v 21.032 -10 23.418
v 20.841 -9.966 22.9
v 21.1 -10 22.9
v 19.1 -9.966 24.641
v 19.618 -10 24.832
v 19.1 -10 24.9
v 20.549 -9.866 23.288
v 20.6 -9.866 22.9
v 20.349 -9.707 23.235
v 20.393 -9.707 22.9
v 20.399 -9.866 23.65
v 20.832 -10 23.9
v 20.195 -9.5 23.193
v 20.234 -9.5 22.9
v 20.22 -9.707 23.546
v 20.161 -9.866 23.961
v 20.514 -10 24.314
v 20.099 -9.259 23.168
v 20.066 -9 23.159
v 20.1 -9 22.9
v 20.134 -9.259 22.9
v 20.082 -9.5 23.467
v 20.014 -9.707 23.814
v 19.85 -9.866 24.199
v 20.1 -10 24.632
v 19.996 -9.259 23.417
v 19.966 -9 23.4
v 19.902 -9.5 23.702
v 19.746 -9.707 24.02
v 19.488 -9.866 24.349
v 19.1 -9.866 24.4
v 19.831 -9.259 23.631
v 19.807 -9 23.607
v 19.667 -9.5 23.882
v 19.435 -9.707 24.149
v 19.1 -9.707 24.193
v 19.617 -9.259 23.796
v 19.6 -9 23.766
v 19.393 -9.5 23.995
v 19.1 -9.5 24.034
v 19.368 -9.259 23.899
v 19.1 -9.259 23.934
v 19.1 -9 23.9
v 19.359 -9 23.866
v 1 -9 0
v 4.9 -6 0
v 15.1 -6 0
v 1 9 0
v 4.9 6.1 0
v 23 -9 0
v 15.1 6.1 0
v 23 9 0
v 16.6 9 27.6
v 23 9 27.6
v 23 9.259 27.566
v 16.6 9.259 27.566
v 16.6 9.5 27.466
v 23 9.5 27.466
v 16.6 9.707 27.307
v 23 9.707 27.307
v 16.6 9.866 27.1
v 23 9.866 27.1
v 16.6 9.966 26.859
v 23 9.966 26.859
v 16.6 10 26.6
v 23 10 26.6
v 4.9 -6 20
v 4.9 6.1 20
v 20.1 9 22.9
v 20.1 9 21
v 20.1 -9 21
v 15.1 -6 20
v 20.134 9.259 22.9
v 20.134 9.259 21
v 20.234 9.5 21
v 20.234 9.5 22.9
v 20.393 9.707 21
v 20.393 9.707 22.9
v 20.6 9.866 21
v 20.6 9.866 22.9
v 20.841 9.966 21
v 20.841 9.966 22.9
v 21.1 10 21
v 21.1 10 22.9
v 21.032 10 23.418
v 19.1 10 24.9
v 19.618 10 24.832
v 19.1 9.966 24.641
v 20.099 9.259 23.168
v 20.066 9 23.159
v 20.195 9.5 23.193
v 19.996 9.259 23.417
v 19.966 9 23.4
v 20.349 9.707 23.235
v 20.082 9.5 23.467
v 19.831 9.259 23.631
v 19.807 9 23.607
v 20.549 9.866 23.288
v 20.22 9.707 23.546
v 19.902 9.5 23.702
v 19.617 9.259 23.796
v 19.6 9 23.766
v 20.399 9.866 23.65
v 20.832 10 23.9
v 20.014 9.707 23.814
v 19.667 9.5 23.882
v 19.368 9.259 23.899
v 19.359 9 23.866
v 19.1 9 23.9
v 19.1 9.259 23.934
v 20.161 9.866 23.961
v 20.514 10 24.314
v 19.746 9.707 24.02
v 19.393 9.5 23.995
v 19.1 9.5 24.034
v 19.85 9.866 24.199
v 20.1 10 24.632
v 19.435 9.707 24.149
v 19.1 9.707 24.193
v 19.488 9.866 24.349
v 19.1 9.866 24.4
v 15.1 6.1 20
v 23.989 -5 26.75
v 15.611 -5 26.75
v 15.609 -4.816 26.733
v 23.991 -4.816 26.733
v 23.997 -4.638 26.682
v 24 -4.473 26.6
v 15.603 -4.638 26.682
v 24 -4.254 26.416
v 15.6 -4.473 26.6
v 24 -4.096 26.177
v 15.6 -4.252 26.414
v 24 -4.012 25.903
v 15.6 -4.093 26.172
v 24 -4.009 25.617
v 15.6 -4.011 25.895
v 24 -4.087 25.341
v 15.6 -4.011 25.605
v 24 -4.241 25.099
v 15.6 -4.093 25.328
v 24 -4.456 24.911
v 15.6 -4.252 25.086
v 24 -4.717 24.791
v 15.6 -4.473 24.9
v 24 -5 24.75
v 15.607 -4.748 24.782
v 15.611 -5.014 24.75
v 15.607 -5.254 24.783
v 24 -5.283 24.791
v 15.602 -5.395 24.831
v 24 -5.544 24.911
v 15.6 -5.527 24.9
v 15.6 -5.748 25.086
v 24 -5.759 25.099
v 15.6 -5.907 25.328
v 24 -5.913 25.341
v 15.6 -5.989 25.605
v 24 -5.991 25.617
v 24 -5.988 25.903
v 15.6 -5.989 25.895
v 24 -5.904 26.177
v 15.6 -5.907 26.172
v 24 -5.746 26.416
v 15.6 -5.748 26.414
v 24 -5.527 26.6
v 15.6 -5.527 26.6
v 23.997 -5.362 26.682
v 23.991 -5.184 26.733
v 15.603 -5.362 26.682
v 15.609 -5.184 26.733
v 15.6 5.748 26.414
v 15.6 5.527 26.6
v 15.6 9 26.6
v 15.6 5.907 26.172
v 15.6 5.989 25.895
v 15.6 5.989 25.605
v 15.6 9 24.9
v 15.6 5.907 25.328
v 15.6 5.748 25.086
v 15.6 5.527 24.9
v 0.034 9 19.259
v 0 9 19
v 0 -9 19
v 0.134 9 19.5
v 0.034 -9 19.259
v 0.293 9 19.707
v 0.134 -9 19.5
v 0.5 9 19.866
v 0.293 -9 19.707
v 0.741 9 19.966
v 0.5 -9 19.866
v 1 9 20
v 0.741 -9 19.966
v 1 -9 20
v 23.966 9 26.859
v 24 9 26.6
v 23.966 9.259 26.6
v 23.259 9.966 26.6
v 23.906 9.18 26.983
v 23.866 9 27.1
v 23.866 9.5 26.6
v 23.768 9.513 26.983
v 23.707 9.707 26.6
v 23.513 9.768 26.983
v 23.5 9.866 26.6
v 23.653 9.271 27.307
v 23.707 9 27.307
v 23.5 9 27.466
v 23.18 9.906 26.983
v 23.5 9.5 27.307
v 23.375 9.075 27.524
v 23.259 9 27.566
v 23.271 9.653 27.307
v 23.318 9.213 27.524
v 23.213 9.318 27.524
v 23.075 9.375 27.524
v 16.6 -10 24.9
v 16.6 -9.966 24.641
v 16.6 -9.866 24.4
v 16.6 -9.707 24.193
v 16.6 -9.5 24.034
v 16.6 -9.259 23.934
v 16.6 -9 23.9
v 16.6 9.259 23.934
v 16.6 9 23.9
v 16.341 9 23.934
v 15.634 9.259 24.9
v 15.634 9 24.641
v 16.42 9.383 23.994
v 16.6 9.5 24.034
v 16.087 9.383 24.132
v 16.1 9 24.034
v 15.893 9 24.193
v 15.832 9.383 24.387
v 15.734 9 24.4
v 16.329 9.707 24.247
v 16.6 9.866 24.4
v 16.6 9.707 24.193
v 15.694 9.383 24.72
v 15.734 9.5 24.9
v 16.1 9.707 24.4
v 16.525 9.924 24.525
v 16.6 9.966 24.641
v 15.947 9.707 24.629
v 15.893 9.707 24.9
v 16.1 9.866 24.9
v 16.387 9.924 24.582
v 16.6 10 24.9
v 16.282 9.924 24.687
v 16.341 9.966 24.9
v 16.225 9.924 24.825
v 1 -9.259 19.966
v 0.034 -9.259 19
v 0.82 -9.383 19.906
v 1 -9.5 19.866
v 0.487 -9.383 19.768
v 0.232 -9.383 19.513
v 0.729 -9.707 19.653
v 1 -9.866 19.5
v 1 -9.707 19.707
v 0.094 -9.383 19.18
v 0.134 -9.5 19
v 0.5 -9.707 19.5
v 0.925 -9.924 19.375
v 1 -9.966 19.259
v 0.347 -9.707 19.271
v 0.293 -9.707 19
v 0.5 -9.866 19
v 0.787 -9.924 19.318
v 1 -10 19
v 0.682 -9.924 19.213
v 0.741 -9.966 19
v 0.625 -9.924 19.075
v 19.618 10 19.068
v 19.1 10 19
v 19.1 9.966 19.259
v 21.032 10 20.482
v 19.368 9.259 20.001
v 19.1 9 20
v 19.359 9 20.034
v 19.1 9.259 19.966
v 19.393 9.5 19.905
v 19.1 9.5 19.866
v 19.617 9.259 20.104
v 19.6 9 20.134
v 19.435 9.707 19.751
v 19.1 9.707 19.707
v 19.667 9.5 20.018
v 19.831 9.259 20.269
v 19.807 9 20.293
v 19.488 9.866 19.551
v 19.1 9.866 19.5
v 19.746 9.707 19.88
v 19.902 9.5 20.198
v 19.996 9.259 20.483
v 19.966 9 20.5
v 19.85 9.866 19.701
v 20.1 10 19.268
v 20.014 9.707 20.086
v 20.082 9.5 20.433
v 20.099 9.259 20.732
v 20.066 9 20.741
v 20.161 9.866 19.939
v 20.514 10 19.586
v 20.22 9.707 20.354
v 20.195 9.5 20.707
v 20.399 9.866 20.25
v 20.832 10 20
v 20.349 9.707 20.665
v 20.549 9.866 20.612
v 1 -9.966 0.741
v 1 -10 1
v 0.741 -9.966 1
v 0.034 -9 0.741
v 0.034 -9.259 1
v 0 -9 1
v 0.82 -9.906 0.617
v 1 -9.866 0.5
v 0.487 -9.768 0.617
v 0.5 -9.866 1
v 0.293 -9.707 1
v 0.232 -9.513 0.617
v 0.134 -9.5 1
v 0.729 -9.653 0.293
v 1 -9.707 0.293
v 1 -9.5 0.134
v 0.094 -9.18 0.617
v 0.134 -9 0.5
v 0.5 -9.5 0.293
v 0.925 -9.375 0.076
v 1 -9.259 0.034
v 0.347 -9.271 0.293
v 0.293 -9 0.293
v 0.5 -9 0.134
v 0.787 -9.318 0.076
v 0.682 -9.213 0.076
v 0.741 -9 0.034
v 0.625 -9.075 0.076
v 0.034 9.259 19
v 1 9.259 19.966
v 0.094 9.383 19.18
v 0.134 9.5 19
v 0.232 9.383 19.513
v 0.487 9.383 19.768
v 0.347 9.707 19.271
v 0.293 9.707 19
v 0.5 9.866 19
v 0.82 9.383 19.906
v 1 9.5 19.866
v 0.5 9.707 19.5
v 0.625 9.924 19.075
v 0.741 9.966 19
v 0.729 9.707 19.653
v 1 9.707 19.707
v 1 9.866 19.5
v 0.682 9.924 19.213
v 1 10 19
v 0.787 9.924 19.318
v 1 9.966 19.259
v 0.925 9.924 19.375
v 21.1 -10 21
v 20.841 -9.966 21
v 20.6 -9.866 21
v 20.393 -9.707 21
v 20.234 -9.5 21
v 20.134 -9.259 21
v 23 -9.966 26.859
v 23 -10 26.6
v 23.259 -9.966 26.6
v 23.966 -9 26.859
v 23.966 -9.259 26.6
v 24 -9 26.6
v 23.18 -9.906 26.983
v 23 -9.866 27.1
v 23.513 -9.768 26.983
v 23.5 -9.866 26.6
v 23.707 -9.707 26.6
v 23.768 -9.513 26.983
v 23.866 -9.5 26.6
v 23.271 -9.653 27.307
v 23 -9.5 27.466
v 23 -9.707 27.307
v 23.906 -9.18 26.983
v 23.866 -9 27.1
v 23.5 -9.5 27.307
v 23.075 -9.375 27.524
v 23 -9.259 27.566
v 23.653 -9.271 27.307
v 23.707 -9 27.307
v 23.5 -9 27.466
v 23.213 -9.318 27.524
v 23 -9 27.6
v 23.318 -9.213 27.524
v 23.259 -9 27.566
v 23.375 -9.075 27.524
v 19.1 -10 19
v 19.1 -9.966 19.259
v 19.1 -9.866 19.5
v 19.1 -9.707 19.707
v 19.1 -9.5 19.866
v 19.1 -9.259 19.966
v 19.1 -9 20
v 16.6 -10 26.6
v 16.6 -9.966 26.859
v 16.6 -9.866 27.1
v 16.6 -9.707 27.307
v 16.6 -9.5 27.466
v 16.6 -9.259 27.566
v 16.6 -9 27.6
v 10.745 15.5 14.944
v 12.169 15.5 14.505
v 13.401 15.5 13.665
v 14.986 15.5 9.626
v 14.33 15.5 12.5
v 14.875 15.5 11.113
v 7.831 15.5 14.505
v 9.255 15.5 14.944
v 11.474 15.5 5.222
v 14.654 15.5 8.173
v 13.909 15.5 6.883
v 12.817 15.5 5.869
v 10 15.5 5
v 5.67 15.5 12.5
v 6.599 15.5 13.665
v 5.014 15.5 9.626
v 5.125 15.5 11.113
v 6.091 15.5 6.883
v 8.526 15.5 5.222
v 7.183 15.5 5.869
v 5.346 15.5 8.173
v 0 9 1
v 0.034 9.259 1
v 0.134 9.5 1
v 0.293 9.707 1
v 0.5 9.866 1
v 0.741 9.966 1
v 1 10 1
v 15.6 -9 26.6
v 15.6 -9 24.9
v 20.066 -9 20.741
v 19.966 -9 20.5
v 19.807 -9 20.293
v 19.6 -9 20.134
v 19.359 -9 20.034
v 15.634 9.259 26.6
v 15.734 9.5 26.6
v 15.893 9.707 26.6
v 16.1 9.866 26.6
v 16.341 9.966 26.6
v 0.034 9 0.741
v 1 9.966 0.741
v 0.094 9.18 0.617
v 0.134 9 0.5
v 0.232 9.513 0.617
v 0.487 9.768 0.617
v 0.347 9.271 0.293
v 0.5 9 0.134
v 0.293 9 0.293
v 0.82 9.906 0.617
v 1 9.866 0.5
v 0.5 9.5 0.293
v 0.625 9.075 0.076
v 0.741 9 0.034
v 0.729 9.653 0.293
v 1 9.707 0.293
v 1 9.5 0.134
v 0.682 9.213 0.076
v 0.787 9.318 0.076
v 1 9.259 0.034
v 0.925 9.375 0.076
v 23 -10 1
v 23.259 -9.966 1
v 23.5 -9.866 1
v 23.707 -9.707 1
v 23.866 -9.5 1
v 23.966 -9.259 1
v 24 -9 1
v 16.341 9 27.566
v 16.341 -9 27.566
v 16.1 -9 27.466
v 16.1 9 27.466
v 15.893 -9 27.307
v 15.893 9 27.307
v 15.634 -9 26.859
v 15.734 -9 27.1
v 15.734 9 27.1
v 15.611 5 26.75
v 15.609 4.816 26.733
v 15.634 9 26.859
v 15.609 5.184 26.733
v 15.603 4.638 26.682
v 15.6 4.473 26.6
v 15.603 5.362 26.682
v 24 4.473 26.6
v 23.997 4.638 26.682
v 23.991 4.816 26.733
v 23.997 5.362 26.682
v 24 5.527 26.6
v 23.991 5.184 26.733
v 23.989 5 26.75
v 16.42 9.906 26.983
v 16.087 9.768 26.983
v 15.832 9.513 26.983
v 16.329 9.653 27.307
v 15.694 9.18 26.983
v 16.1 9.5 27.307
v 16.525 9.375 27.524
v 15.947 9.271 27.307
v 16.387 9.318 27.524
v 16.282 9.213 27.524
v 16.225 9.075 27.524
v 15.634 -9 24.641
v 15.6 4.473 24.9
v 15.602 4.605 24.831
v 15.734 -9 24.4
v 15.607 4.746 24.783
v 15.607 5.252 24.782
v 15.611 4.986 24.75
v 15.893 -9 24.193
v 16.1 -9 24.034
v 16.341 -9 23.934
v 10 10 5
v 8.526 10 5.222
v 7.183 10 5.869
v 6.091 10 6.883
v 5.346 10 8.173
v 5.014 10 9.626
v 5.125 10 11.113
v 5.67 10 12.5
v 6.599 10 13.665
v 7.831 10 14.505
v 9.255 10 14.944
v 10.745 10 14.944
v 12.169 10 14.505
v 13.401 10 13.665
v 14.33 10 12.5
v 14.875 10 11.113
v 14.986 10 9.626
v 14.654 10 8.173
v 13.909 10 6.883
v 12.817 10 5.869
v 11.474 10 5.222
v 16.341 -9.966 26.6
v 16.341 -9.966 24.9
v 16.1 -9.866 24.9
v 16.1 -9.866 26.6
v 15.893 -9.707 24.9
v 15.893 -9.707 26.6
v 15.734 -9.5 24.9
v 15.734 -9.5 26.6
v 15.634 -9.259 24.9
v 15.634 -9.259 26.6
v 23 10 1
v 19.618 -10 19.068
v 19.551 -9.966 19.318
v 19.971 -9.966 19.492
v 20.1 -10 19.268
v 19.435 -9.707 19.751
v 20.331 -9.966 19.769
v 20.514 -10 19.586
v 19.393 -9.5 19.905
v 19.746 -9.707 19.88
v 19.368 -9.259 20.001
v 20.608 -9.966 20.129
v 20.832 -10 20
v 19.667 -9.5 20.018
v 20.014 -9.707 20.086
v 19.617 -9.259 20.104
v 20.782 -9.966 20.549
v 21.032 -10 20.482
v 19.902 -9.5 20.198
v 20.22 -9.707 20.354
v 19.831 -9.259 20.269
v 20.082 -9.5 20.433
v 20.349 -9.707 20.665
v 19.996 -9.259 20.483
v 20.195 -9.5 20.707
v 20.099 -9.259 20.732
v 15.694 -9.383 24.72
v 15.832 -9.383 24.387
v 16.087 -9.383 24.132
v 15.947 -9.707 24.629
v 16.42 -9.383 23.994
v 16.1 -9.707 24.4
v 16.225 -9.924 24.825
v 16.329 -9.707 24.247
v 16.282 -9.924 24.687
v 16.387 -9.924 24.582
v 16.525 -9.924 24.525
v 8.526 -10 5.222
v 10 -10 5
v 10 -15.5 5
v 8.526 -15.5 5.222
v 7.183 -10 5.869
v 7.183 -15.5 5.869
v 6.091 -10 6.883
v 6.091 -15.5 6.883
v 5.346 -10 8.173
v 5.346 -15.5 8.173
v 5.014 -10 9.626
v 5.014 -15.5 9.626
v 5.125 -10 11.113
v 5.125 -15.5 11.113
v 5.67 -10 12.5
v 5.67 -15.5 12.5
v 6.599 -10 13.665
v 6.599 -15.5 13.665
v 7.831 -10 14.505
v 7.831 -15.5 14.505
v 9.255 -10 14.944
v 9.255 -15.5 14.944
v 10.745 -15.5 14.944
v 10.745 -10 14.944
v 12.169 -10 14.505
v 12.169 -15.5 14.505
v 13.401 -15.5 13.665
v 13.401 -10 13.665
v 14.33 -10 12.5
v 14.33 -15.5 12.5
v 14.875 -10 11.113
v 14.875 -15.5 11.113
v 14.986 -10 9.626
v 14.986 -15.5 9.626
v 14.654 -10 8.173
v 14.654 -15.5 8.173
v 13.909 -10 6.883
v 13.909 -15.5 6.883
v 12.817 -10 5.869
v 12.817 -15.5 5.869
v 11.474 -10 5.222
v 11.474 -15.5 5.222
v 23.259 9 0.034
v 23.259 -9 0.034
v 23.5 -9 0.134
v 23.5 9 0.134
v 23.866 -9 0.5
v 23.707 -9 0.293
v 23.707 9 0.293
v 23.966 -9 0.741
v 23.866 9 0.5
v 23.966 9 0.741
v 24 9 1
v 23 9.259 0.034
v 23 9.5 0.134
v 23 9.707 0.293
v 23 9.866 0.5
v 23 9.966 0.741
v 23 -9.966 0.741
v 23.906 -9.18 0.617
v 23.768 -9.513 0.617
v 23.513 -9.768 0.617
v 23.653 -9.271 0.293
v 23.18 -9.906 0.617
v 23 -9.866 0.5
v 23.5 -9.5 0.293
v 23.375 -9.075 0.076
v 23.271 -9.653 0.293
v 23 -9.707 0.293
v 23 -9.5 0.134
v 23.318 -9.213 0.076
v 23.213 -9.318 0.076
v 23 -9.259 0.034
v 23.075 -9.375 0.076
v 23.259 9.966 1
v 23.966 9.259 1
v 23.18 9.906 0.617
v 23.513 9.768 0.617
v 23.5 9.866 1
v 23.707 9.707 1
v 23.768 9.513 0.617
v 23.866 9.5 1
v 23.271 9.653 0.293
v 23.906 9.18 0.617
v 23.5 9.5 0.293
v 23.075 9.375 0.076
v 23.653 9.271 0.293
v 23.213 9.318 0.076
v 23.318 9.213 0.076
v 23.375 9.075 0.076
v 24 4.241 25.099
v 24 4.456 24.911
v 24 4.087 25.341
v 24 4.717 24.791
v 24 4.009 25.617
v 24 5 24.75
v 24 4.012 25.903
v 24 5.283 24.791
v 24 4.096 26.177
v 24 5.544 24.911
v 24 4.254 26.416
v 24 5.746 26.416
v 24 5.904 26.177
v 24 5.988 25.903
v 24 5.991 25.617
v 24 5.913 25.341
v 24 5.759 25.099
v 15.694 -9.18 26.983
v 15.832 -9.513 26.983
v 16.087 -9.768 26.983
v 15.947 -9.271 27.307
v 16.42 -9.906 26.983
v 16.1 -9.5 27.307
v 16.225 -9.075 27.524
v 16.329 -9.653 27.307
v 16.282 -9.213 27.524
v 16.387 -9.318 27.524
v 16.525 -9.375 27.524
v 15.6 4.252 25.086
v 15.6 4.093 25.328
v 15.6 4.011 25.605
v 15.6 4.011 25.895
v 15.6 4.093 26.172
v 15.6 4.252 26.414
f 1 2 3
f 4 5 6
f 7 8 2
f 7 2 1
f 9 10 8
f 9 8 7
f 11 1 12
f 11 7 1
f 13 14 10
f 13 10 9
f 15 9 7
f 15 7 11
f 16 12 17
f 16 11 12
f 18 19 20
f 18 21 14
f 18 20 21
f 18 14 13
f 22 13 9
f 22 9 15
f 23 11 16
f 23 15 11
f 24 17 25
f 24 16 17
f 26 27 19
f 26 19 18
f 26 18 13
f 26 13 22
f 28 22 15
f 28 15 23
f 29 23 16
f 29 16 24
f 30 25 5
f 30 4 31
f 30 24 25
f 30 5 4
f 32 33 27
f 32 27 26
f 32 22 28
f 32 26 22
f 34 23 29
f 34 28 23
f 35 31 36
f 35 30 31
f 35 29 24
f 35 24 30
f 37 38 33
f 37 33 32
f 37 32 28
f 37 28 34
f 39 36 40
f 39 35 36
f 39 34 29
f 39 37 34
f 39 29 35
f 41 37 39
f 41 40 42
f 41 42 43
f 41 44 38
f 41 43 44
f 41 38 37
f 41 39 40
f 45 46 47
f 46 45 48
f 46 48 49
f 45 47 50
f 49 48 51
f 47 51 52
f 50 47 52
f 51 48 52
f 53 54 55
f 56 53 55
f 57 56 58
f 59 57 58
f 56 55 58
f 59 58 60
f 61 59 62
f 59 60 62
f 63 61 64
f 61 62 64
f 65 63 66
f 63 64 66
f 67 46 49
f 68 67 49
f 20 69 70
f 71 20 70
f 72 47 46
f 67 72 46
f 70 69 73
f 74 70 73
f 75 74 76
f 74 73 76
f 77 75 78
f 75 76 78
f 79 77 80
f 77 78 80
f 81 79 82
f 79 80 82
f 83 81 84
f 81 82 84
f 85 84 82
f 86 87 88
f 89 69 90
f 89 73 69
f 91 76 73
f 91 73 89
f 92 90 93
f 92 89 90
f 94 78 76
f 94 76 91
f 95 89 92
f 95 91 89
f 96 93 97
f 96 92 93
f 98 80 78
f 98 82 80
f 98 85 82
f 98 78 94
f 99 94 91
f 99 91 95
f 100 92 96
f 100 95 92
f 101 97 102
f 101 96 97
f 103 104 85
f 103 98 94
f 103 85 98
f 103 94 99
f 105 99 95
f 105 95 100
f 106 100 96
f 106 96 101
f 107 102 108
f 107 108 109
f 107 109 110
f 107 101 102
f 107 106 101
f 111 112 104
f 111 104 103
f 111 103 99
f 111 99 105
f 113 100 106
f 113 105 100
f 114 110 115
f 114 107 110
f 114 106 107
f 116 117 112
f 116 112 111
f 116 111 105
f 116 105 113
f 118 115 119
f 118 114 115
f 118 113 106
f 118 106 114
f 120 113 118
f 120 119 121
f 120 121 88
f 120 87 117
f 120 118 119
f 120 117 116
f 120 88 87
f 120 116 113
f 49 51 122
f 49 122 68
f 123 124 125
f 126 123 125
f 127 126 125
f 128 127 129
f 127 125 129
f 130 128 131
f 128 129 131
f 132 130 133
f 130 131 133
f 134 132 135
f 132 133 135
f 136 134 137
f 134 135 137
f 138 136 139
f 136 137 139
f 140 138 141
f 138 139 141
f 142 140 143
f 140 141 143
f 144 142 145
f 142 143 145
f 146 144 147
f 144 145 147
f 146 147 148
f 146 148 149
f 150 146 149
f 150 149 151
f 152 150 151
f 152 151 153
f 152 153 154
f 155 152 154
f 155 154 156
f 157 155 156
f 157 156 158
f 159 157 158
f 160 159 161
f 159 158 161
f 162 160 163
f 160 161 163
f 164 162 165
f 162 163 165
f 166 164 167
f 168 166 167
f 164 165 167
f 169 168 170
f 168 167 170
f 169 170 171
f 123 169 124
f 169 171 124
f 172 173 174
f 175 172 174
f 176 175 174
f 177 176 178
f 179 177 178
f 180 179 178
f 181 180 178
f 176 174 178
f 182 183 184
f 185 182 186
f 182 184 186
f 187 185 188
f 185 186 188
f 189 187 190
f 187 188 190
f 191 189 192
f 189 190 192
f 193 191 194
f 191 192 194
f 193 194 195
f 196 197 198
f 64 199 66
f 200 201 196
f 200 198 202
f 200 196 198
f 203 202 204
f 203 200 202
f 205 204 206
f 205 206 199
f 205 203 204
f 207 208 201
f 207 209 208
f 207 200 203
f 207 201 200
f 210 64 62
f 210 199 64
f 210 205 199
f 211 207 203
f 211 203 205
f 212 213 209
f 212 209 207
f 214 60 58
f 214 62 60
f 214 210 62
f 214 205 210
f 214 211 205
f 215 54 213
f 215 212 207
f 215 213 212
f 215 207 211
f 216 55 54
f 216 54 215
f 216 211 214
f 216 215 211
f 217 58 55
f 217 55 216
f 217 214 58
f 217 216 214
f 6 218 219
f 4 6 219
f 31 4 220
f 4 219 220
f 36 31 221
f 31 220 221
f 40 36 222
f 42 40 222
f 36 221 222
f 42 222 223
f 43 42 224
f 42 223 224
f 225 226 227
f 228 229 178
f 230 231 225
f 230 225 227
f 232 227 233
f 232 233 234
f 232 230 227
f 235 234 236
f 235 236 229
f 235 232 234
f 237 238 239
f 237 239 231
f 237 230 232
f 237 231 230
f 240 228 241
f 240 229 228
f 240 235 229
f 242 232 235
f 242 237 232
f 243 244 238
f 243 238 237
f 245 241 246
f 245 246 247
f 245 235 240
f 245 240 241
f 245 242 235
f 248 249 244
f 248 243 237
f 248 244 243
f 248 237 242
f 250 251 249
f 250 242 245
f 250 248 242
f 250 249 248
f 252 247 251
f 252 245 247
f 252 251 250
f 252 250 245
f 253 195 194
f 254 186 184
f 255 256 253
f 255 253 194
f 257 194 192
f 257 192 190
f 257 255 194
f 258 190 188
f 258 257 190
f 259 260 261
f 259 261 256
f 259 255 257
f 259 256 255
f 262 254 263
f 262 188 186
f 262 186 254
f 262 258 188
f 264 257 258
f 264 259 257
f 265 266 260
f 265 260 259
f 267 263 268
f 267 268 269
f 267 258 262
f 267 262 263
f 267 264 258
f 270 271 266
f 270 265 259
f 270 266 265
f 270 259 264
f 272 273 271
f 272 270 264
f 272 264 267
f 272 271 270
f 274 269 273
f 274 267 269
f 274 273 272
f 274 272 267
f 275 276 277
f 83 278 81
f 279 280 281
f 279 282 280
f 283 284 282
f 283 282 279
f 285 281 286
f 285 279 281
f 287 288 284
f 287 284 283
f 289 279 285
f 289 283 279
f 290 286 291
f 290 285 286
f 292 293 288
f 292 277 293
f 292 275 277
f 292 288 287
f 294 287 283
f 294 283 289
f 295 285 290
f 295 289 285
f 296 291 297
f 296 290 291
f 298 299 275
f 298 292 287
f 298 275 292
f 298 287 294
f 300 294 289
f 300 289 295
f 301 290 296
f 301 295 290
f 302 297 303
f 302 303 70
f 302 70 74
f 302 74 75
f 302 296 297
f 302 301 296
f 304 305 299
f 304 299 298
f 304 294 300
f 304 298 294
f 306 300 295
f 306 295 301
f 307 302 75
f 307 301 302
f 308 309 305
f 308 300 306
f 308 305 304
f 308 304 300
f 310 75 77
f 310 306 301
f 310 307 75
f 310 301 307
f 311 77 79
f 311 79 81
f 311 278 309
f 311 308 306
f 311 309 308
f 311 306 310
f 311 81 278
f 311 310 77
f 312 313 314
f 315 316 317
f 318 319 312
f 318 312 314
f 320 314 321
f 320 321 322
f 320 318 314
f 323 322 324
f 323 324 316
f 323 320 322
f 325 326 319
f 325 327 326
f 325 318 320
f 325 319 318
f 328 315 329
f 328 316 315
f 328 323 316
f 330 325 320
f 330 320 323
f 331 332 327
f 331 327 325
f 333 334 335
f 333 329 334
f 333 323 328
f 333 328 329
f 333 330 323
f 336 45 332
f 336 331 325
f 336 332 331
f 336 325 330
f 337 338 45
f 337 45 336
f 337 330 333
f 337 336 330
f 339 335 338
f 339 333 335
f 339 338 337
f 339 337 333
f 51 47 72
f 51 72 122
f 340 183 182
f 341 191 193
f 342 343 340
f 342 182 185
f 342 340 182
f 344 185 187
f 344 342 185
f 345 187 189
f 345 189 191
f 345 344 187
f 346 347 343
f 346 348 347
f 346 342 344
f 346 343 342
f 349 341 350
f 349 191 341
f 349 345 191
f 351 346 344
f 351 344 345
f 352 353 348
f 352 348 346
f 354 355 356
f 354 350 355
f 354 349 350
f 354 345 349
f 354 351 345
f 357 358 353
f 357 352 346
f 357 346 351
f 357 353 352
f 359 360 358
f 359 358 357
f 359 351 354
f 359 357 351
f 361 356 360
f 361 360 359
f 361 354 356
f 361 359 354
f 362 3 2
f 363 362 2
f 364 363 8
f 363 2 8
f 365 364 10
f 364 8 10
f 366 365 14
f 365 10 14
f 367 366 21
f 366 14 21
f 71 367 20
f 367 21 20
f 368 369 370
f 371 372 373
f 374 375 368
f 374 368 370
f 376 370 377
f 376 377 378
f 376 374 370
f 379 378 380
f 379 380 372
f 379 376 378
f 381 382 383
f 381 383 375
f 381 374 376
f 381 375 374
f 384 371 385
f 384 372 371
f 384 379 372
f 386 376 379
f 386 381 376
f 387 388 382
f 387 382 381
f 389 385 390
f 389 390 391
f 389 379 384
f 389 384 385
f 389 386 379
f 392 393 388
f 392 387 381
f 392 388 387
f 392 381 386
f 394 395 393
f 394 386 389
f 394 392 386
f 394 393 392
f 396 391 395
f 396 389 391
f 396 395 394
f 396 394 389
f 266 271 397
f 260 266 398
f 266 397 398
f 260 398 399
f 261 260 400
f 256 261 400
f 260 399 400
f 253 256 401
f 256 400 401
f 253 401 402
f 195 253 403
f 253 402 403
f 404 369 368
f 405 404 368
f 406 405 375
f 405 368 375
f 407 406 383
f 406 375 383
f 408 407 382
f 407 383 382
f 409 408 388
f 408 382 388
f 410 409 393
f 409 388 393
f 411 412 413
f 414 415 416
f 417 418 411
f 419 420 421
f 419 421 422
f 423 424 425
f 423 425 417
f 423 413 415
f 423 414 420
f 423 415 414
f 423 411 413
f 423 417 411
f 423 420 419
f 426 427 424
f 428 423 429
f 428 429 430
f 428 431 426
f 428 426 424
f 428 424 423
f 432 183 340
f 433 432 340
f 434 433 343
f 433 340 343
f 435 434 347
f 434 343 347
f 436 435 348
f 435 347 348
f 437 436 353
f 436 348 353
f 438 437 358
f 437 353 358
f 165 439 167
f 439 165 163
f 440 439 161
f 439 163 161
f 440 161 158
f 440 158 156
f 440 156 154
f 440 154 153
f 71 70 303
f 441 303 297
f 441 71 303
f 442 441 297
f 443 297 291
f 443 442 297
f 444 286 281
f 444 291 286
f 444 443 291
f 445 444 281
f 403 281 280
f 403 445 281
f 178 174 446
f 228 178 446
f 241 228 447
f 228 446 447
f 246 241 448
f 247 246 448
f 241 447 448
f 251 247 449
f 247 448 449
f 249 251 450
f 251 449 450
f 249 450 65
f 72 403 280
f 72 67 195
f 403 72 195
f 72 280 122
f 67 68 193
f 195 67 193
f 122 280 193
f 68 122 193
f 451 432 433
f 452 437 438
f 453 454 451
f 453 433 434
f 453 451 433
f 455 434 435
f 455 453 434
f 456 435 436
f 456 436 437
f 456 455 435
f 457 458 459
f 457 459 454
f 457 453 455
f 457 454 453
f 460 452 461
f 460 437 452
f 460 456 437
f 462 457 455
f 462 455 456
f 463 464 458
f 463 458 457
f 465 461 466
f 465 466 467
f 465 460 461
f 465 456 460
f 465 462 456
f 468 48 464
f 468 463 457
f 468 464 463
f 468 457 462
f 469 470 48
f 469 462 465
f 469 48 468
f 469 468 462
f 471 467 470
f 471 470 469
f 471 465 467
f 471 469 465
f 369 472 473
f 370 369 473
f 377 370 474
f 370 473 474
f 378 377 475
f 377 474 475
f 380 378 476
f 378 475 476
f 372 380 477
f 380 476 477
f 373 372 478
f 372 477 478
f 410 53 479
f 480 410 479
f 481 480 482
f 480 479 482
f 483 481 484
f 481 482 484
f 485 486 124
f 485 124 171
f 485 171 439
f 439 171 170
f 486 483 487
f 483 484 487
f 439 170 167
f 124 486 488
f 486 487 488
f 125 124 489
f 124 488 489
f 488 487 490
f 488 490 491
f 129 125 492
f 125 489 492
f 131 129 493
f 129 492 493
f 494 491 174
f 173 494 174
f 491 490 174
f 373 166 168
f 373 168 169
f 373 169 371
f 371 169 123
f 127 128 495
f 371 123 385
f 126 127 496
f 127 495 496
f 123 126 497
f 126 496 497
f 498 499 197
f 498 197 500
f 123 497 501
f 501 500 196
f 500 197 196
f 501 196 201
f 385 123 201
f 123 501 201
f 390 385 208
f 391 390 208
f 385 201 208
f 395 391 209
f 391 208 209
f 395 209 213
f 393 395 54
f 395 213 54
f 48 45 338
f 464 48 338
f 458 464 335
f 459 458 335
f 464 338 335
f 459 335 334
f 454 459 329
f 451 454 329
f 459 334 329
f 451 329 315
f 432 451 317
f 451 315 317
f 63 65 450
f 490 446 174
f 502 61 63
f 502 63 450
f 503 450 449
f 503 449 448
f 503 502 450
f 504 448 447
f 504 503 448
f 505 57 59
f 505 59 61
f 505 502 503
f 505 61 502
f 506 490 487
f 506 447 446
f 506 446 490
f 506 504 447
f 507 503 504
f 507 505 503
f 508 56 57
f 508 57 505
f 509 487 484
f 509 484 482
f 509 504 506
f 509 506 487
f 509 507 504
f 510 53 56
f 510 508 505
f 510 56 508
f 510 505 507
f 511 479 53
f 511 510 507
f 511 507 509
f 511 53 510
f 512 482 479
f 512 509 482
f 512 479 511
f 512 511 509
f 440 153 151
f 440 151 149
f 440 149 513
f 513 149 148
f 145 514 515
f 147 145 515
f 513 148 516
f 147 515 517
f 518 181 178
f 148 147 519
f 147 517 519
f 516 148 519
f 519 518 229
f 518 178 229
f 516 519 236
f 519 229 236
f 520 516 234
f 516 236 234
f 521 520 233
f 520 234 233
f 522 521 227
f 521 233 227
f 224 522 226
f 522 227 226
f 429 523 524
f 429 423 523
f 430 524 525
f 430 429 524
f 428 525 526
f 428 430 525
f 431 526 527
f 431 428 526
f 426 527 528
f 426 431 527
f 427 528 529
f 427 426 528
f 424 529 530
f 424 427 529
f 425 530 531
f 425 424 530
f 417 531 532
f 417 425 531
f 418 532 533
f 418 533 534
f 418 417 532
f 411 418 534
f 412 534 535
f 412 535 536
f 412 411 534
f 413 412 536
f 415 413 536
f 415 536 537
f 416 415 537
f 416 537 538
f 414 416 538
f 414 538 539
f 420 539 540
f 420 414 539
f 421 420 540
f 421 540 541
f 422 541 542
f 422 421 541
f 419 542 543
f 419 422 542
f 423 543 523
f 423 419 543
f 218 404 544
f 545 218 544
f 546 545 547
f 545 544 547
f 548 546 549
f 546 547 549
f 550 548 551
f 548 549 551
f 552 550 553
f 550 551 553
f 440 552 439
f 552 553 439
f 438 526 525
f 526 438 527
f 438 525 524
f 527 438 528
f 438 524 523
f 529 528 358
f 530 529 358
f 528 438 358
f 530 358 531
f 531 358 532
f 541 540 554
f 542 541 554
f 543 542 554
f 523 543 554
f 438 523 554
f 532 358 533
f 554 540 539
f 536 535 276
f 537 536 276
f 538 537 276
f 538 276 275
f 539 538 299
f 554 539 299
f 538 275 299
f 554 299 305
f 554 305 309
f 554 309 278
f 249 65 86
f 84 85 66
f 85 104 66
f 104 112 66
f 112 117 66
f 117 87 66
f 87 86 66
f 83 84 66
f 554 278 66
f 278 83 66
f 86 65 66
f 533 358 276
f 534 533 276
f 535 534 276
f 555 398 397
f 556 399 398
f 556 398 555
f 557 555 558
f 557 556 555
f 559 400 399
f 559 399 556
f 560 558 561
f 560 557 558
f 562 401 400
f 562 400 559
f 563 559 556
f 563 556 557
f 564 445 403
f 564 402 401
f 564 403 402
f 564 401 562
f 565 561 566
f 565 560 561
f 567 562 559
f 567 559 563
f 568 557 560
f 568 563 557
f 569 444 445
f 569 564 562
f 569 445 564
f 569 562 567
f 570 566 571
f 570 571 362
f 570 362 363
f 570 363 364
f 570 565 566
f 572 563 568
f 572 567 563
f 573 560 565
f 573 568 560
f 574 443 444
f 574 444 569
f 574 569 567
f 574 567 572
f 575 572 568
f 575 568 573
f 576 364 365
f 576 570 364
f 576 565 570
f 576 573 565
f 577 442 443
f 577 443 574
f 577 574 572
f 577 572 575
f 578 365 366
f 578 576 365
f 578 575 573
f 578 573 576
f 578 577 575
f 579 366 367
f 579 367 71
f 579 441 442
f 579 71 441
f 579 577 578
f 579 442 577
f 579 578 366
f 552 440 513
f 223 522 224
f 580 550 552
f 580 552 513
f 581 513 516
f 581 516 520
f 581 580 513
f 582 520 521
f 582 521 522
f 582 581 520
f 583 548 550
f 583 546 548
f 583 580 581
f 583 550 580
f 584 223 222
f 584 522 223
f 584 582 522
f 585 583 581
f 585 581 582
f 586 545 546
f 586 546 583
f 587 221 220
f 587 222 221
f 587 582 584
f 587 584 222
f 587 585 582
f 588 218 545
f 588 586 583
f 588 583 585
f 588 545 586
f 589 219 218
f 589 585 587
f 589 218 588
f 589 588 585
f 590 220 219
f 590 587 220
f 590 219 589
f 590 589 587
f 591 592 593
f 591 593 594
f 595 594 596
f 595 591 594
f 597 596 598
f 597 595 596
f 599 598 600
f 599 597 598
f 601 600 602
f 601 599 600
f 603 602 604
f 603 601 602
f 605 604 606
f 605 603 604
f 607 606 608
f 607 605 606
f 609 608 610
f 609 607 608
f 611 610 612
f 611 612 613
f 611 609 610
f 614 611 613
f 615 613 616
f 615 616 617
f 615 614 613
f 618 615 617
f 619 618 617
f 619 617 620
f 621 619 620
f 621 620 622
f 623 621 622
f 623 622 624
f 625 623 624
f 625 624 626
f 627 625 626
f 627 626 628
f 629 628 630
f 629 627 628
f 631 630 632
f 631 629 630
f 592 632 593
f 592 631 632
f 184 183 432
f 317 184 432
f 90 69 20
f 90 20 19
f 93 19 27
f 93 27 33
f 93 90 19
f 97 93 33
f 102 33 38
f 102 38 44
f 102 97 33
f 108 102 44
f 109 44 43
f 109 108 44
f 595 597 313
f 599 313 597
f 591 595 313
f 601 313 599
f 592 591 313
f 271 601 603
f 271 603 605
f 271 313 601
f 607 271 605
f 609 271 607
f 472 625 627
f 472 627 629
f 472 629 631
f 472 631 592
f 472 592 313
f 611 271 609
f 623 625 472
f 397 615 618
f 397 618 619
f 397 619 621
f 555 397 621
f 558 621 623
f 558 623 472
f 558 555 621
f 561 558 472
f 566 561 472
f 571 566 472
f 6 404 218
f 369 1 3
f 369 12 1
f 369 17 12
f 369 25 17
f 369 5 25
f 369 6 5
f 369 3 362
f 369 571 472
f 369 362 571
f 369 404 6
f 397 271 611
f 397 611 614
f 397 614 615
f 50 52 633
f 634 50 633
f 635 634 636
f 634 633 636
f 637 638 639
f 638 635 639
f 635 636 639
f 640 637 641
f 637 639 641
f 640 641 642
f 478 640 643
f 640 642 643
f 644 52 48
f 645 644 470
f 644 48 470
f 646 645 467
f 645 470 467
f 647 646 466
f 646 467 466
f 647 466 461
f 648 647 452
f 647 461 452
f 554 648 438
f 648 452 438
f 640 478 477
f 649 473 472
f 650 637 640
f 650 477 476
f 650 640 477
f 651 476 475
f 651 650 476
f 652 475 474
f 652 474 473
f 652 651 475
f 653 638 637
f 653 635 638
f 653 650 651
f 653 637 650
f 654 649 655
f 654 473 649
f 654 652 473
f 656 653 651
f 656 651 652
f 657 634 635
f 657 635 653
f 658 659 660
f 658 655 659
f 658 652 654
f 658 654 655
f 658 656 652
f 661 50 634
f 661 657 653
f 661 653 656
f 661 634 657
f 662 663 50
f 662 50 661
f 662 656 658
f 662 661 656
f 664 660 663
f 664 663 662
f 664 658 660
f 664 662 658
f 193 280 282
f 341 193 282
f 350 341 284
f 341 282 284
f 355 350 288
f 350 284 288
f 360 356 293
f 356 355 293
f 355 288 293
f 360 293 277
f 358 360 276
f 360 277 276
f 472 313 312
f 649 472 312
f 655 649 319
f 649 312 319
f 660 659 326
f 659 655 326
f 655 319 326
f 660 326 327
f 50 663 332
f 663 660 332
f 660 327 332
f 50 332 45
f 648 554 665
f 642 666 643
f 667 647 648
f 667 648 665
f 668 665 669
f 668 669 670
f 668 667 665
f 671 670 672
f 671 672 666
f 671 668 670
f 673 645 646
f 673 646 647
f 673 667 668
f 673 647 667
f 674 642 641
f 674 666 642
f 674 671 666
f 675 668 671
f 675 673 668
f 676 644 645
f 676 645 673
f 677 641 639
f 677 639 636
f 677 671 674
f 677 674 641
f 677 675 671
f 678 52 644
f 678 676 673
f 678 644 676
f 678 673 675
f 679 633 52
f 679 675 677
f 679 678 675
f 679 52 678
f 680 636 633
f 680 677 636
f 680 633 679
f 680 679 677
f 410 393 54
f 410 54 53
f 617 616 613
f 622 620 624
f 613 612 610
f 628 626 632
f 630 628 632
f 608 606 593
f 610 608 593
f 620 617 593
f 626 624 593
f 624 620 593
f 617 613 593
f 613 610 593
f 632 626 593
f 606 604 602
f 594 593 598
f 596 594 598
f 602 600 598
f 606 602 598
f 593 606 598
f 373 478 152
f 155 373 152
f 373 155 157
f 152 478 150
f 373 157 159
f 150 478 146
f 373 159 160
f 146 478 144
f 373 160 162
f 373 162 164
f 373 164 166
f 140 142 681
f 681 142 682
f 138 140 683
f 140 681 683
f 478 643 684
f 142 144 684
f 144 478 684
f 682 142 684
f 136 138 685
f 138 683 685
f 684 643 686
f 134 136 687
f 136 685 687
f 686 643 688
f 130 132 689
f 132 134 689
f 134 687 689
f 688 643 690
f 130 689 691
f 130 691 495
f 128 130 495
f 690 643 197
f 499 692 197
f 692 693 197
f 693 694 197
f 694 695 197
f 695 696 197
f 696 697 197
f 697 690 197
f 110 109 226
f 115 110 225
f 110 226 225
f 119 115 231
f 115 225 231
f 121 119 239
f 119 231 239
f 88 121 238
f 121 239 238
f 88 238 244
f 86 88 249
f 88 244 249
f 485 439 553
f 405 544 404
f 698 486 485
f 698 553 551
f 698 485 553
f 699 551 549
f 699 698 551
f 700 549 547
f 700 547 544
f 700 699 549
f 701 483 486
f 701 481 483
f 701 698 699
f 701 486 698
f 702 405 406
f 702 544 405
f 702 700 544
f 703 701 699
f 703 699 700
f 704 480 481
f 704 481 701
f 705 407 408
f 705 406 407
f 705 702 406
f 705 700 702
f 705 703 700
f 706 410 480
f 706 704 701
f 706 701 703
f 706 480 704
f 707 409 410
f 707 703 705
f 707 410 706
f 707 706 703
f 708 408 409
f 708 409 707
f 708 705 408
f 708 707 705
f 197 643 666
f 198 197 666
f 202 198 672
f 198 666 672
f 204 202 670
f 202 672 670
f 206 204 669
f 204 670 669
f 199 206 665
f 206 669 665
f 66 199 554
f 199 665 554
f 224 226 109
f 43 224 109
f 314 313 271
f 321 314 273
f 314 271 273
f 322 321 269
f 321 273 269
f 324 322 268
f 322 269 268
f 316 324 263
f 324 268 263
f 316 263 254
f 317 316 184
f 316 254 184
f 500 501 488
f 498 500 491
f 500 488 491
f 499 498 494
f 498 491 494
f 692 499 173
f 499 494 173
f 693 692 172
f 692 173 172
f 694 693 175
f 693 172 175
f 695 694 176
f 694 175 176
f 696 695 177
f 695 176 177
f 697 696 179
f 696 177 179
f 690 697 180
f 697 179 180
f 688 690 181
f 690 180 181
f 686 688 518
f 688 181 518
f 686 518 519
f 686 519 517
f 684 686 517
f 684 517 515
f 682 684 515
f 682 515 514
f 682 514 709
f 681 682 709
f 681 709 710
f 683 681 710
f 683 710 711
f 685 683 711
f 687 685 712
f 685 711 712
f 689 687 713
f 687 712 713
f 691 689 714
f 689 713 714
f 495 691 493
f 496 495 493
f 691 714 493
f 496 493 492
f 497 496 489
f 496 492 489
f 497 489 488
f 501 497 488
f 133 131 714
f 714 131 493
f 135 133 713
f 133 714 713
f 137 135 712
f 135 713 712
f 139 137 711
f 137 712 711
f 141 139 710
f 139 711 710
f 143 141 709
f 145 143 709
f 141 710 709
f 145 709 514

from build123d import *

# Parameters (mm, degrees)
EXTRUDE_1_DEPTH     = 10
SKETCH_3_R          = 5
EXTRUDE_2_DEPTH     = 15.5
SKETCH_2_W          = 10.2
SKETCH_2_H          = 12.1
CUT_EXTRUDE_1_DEPTH = 40.724174
SKETCH_4_R          = 1
CUT_EXTRUDE_2_DEPTH = 36.289800226
FILLET_1_R          = 1


with BuildPart() as part:
    # 草图1 → 凸台-拉伸1 (new, symmetric)
    with BuildSketch(Plane(origin=(0, 0, 0), x_dir=(1, 0, 0), z_dir=(0, 1, 0))):
        Polygon((0, 0), (24, 0), (24, -27.6), (15.6, -27.6), (15.6, -23.9), (20.1, -23.9), (20.1, -20), (0, -20), align=None)
    extrude(amount=EXTRUDE_1_DEPTH, both=True)

    # 草图3 → 凸台-拉伸2 (add, symmetric)
    with BuildSketch(Plane(origin=(0, 0, 0), x_dir=(1, 0, 0), z_dir=(0, 1, 0))):
        with Locations(Location((10, -10, 0), (0, 0, 90))):
            Circle(SKETCH_3_R)
    extrude(amount=EXTRUDE_2_DEPTH, both=True)

    # 草图2 → 切除-拉伸1 (cut, through all)
    with BuildSketch(Plane(origin=(0, 0, 0), x_dir=(-1, 0, 0), z_dir=(0, 0, -1))):
        with Locations((-10, 0.05)):
            Rectangle(SKETCH_2_W, SKETCH_2_H)
    extrude(amount=-CUT_EXTRUDE_1_DEPTH, mode=Mode.SUBTRACT)

    # 草图4 → 切除-拉伸2 (cut, through all)
    with BuildSketch(Plane.ZY.offset(-15.6)):
        with Locations((25.75, 5)):
            Circle(SKETCH_4_R)
        with Locations((25.75, -5)):
            Circle(SKETCH_4_R)
    extrude(amount=-CUT_EXTRUDE_2_DEPTH, mode=Mode.SUBTRACT)

    # 圆角1
    # the kernel refuses this fillet: 1 mm, written as the material it adds along each edge
    with BuildSketch(Plane(origin=(20.1, 10, 23.9), x_dir=(0, 0, -1), z_dir=(0, -1, 0))) as fillet_1_piece_1:
        with BuildLine():
            CenterArc((FILLET_1_R, -FILLET_1_R), FILLET_1_R, 90, 90)
            Line((0, -FILLET_1_R), (0, 0))
            Line((0, 0), (FILLET_1_R, 0))
        make_face()
    extrude(amount=20)
    with BuildSketch(Plane(origin=(20.1, -10, 20), x_dir=(-1, 0, 0), z_dir=(0, 1, 0))) as fillet_1_piece_2:
        with BuildLine():
            CenterArc((FILLET_1_R, FILLET_1_R), FILLET_1_R, 180, 90)
            Line((0, FILLET_1_R), (0, 0))
            Line((0, 0), (FILLET_1_R, 0))
        make_face()
    extrude(amount=20)
    # the kernel refuses this fillet: 1 mm, written as the material it takes off along each edge
    with BuildSketch(Plane(origin=(1, -9, 1), x_dir=(-1, 0, 0), z_dir=(0, 0, -1))) as fillet_1_2_piece_1_section:
        Polygon((0, 0), (FILLET_1_R, 0), (FILLET_1_R, -FILLET_1_R), (0, -FILLET_1_R), align=None)
    fillet_1_2_piece_1 = extrude(amount=FILLET_1_R, mode=Mode.PRIVATE)
    fillet_1_2_piece_1 = fillet_1_2_piece_1 - Plane(origin=(1, -9, 1), x_dir=(0.7071067811865475, 0.7071067811865475, 0), z_dir=(0, 0, -1)) * Sphere(FILLET_1_R, mode=Mode.PRIVATE)
    add(fillet_1_2_piece_1, mode=Mode.SUBTRACT)
    with BuildSketch(Plane(origin=(1, 9, 1), x_dir=(-1, 0, 0), z_dir=(0, 0, -1))) as fillet_1_2_piece_2_section:
        Polygon((0, 0), (FILLET_1_R, 0), (FILLET_1_R, FILLET_1_R), (0, FILLET_1_R), align=None)
    fillet_1_2_piece_2 = extrude(amount=FILLET_1_R, mode=Mode.PRIVATE)
    fillet_1_2_piece_2 = fillet_1_2_piece_2 - Plane(origin=(1, 9, 1), x_dir=(0.7071067811865475, -0.7071067811865475, 0), z_dir=(0, 0, -1)) * Sphere(FILLET_1_R, mode=Mode.PRIVATE)
    add(fillet_1_2_piece_2, mode=Mode.SUBTRACT)
    with BuildSketch(Plane(origin=(23, 9, 1), x_dir=(0, 1, 0), z_dir=(0, 0, -1))) as fillet_1_2_piece_3_section:
        Polygon((0, 0), (FILLET_1_R, 0), (FILLET_1_R, FILLET_1_R), (0, FILLET_1_R), align=None)
    fillet_1_2_piece_3 = extrude(amount=FILLET_1_R, mode=Mode.PRIVATE)
    fillet_1_2_piece_3 = fillet_1_2_piece_3 - Plane(origin=(23, 9, 1), x_dir=(-0.7071067811865475, -0.7071067811865475, 0), z_dir=(0, 0, -1)) * Sphere(FILLET_1_R, mode=Mode.PRIVATE)
    add(fillet_1_2_piece_3, mode=Mode.SUBTRACT)
    with BuildSketch(Plane(origin=(23, -9, 1), x_dir=(0, -1, 0), z_dir=(0, 0, -1))) as fillet_1_2_piece_4_section:
        Polygon((0, 0), (FILLET_1_R, 0), (FILLET_1_R, -FILLET_1_R), (0, -FILLET_1_R), align=None)
    fillet_1_2_piece_4 = extrude(amount=FILLET_1_R, mode=Mode.PRIVATE)
    fillet_1_2_piece_4 = fillet_1_2_piece_4 - Plane(origin=(23, -9, 1), x_dir=(-0.7071067811865475, 0.7071067811865475, 0), z_dir=(0, 0, -1)) * Sphere(FILLET_1_R, mode=Mode.PRIVATE)
    add(fillet_1_2_piece_4, mode=Mode.SUBTRACT)
    with BuildSketch(Plane(origin=(23, 9, 26.6), x_dir=(0, 1, 0), z_dir=(0, 0, 1))) as fillet_1_2_piece_5_section:
        Polygon((0, 0), (FILLET_1_R, 0), (FILLET_1_R, -FILLET_1_R), (0, -FILLET_1_R), align=None)
    fillet_1_2_piece_5 = extrude(amount=FILLET_1_R, mode=Mode.PRIVATE)
    fillet_1_2_piece_5 = fillet_1_2_piece_5 - Plane(origin=(23, 9, 26.6), x_dir=(-0.7071067811865475, -0.7071067811865475, 0), z_dir=(0, 0, 1)) * Sphere(FILLET_1_R, mode=Mode.PRIVATE)
    add(fillet_1_2_piece_5, mode=Mode.SUBTRACT)
    with BuildSketch(Plane(origin=(23, -9, 26.6), x_dir=(0, -1, 0), z_dir=(0, 0, 1))) as fillet_1_2_piece_6_section:
        Polygon((0, 0), (FILLET_1_R, 0), (FILLET_1_R, FILLET_1_R), (0, FILLET_1_R), align=None)
    fillet_1_2_piece_6 = extrude(amount=FILLET_1_R, mode=Mode.PRIVATE)
    fillet_1_2_piece_6 = fillet_1_2_piece_6 - Plane(origin=(23, -9, 26.6), x_dir=(-0.7071067811865475, 0.7071067811865475, 0), z_dir=(0, 0, 1)) * Sphere(FILLET_1_R, mode=Mode.PRIVATE)
    add(fillet_1_2_piece_6, mode=Mode.SUBTRACT)
    with BuildSketch(Plane(origin=(16.6, 9, 26.6), x_dir=(0, 1, 0), z_dir=(0, 0, 1))) as fillet_1_2_piece_7_section:
        Polygon((0, 0), (FILLET_1_R, 0), (FILLET_1_R, FILLET_1_R), (0, FILLET_1_R), align=None)
    fillet_1_2_piece_7 = extrude(amount=FILLET_1_R, mode=Mode.PRIVATE)
    fillet_1_2_piece_7 = fillet_1_2_piece_7 - Plane(origin=(16.6, 9, 26.6), x_dir=(0.7071067811865475, -0.7071067811865475, 0), z_dir=(0, 0, 1)) * Sphere(FILLET_1_R, mode=Mode.PRIVATE)
    add(fillet_1_2_piece_7, mode=Mode.SUBTRACT)
    with BuildSketch(Plane(origin=(16.6, -9, 26.6), x_dir=(0, -1, 0), z_dir=(0, 0, 1))) as fillet_1_2_piece_8_section:
        Polygon((0, 0), (FILLET_1_R, 0), (FILLET_1_R, -FILLET_1_R), (0, -FILLET_1_R), align=None)
    fillet_1_2_piece_8 = extrude(amount=FILLET_1_R, mode=Mode.PRIVATE)
    fillet_1_2_piece_8 = fillet_1_2_piece_8 - Plane(origin=(16.6, -9, 26.6), x_dir=(0.7071067811865475, 0.7071067811865475, 0), z_dir=(0, 0, 1)) * Sphere(FILLET_1_R, mode=Mode.PRIVATE)
    add(fillet_1_2_piece_8, mode=Mode.SUBTRACT)
    with BuildSketch(Plane(origin=(0, -10, 22.5), x_dir=(0, 1, 0), z_dir=(0, 0, -1))) as fillet_1_2_piece_9:
        with BuildLine():
            CenterArc((FILLET_1_R, FILLET_1_R), FILLET_1_R, 180, 90)
            Line((0, FILLET_1_R), (0, 0))
            Line((0, 0), (FILLET_1_R, 0))
        make_face()
    extrude(amount=21.5, mode=Mode.SUBTRACT)
    with BuildSketch(Plane(origin=(0, -9, 0), x_dir=(1, 0, 0), z_dir=(0, 1, 0)), Plane(origin=(24, 9, 0), x_dir=(-1, 0, 0), z_dir=(0, -1, 0)), Plane(origin=(24, 9, 27.6), x_dir=(0, 0, -1), z_dir=(0, -1, 0)), Plane(origin=(15.6, 9, 27.6), x_dir=(1, 0, 0), z_dir=(0, -1, 0))) as fillet_1_2_piece_10:
        with BuildLine():
            CenterArc((FILLET_1_R, -FILLET_1_R), FILLET_1_R, 90, 90)
            Line((0, -FILLET_1_R), (0, 0))
            Line((0, 0), (FILLET_1_R, 0))
        make_face()
    extrude(amount=18, mode=Mode.SUBTRACT)
    with BuildSketch(Plane(origin=(15.6, 12.5, 23.9), x_dir=(0, 0, 1), z_dir=(0, -1, 0)), Plane(origin=(0, -12.5, 20), x_dir=(0, 0, -1), z_dir=(0, 1, 0))) as fillet_1_2_piece_11:
        with BuildLine():
            CenterArc((FILLET_1_R, -FILLET_1_R), FILLET_1_R, 90, 90)
            Line((0, -FILLET_1_R), (0, 0))
            Line((0, 0), (FILLET_1_R, 0))
        make_face()
    extrude(amount=25, mode=Mode.SUBTRACT)
    with BuildSketch(Plane(origin=(15.6, 10, 26.6), x_dir=(1, 0, 0), z_dir=(0, 0, -1))) as fillet_1_2_piece_12:
        with BuildLine():
            CenterArc((FILLET_1_R, FILLET_1_R), FILLET_1_R, 180, 90)
            Line((0, FILLET_1_R), (0, 0))
            Line((0, 0), (FILLET_1_R, 0))
        make_face()
    extrude(amount=5.2, mode=Mode.SUBTRACT)
    with BuildSketch(Plane(origin=(23, 10, 27.6), x_dir=(0, 0, -1), z_dir=(-1, 0, 0))) as fillet_1_2_piece_13:
        with BuildLine():
            CenterArc((FILLET_1_R, FILLET_1_R), FILLET_1_R, 180, 90)
            Line((0, FILLET_1_R), (0, 0))
            Line((0, 0), (FILLET_1_R, 0))
        make_face()
    extrude(amount=6.4, mode=Mode.SUBTRACT)
    with BuildSketch(Plane(origin=(24, 10, 1), x_dir=(-1, 0, 0), z_dir=(0, 0, 1))) as fillet_1_2_piece_14:
        with BuildLine():
            CenterArc((FILLET_1_R, FILLET_1_R), FILLET_1_R, 180, 90)
            Line((0, FILLET_1_R), (0, 0))
            Line((0, 0), (FILLET_1_R, 0))
        make_face()
    extrude(amount=25.6, mode=Mode.SUBTRACT)
    with BuildSketch(Plane(origin=(1, 10, 0), x_dir=(0, -1, 0), z_dir=(1, 0, 0))) as fillet_1_2_piece_15:
        with BuildLine():
            CenterArc((FILLET_1_R, -FILLET_1_R), FILLET_1_R, 90, 90)
            Line((0, -FILLET_1_R), (0, 0))
            Line((0, 0), (FILLET_1_R, 0))
        make_face()
    extrude(amount=22, mode=Mode.SUBTRACT)
    with BuildSketch(Plane(origin=(0, 10, 22.5), x_dir=(0, -1, 0), z_dir=(0, 0, -1))) as fillet_1_2_piece_16:
        with BuildLine():
            CenterArc((FILLET_1_R, -FILLET_1_R), FILLET_1_R, 90, 90)
            Line((0, -FILLET_1_R), (0, 0))
            Line((0, 0), (FILLET_1_R, 0))
        make_face()
    extrude(amount=21.5, mode=Mode.SUBTRACT)
    with BuildSketch(Plane(origin=(1, -10, 0), x_dir=(0, 1, 0), z_dir=(1, 0, 0))) as fillet_1_2_piece_17:
        with BuildLine():
            CenterArc((FILLET_1_R, FILLET_1_R), FILLET_1_R, 180, 90)
            Line((0, FILLET_1_R), (0, 0))
            Line((0, 0), (FILLET_1_R, 0))
        make_face()
    extrude(amount=22, mode=Mode.SUBTRACT)
    with BuildSketch(Plane(origin=(24, -10, 1), x_dir=(-1, 0, 0), z_dir=(0, 0, 1))) as fillet_1_2_piece_18:
        with BuildLine():
            CenterArc((FILLET_1_R, -FILLET_1_R), FILLET_1_R, 90, 90)
            Line((0, -FILLET_1_R), (0, 0))
            Line((0, 0), (FILLET_1_R, 0))
        make_face()
    extrude(amount=25.6, mode=Mode.SUBTRACT)
    with BuildSketch(Plane(origin=(23, -10, 27.6), x_dir=(0, 0, -1), z_dir=(-1, 0, 0))) as fillet_1_2_piece_19:
        with BuildLine():
            CenterArc((FILLET_1_R, -FILLET_1_R), FILLET_1_R, 90, 90)
            Line((0, -FILLET_1_R), (0, 0))
            Line((0, 0), (FILLET_1_R, 0))
        make_face()
    extrude(amount=6.4, mode=Mode.SUBTRACT)
    with BuildSketch(Plane(origin=(15.6, -10, 26.6), x_dir=(1, 0, 0), z_dir=(0, 0, -1))) as fillet_1_2_piece_20:
        with BuildLine():
            CenterArc((FILLET_1_R, -FILLET_1_R), FILLET_1_R, 90, 90)
            Line((0, -FILLET_1_R), (0, 0))
            Line((0, 0), (FILLET_1_R, 0))
        make_face()
    extrude(amount=5.2, mode=Mode.SUBTRACT)
    # the kernel refuses this fillet: 1 mm, written as the material it takes off along each edge
    with BuildSketch(Plane(origin=(1, 9, 19), x_dir=(0, 0, 1), z_dir=(0, 1, 0))) as fillet_1_3_piece_1_section:
        Polygon((0, 0), (FILLET_1_R, 0), (FILLET_1_R, -FILLET_1_R), (0, -FILLET_1_R), align=None)
    fillet_1_3_piece_1 = extrude(amount=FILLET_1_R, mode=Mode.PRIVATE)
    fillet_1_3_piece_1 = fillet_1_3_piece_1 - Plane(origin=(1, 9, 19), x_dir=(0.7071067811865475, 0, -0.7071067811865476), z_dir=(0, 1, 0)) * Sphere(FILLET_1_R, mode=Mode.PRIVATE)
    add(fillet_1_3_piece_1, mode=Mode.SUBTRACT)
    with BuildSketch(Plane(origin=(16.6, 9, 24.9), x_dir=(0, 0, -1), z_dir=(0, 1, 0))) as fillet_1_3_piece_2_section:
        Polygon((0, 0), (FILLET_1_R, 0), (FILLET_1_R, FILLET_1_R), (0, FILLET_1_R), align=None)
    fillet_1_3_piece_2 = extrude(amount=FILLET_1_R, mode=Mode.PRIVATE)
    fillet_1_3_piece_2 = fillet_1_3_piece_2 - Plane(origin=(16.6, 9, 24.9), x_dir=(0.7071067811865475, 0, 0.7071067811865475), z_dir=(0, 1, 0)) * Sphere(FILLET_1_R, mode=Mode.PRIVATE)
    add(fillet_1_3_piece_2, mode=Mode.SUBTRACT)
    with BuildSketch(Plane(origin=(1, -9, 19), x_dir=(0, 0, 1), z_dir=(0, -1, 0))) as fillet_1_3_piece_3_section:
        Polygon((0, 0), (FILLET_1_R, 0), (FILLET_1_R, FILLET_1_R), (0, FILLET_1_R), align=None)
    fillet_1_3_piece_3 = extrude(amount=FILLET_1_R, mode=Mode.PRIVATE)
    fillet_1_3_piece_3 = fillet_1_3_piece_3 - Plane(origin=(1, -9, 19), x_dir=(0.7071067811865475, 0, -0.7071067811865476), z_dir=(0, -1, 0)) * Sphere(FILLET_1_R, mode=Mode.PRIVATE)
    add(fillet_1_3_piece_3, mode=Mode.SUBTRACT)
    with BuildSketch(Plane(origin=(16.6, -9, 24.9), x_dir=(0, 0, -1), z_dir=(0, -1, 0))) as fillet_1_3_piece_4_section:
        Polygon((0, 0), (FILLET_1_R, 0), (FILLET_1_R, -FILLET_1_R), (0, -FILLET_1_R), align=None)
    fillet_1_3_piece_4 = extrude(amount=FILLET_1_R, mode=Mode.PRIVATE)
    fillet_1_3_piece_4 = fillet_1_3_piece_4 - Plane(origin=(16.6, -9, 24.9), x_dir=(0.7071067811865475, 0, 0.7071067811865475), z_dir=(0, -1, 0)) * Sphere(FILLET_1_R, mode=Mode.PRIVATE)
    add(fillet_1_3_piece_4, mode=Mode.SUBTRACT)
    with BuildSketch(Plane(origin=(16.6, -10, 23.9), x_dir=(0, 0, 1), z_dir=(1, 0, 0))) as fillet_1_3_piece_5:
        with BuildLine():
            CenterArc((FILLET_1_R, -FILLET_1_R), FILLET_1_R, 90, 90)
            Line((0, -FILLET_1_R), (0, 0))
            Line((0, 0), (FILLET_1_R, 0))
        make_face()
    extrude(amount=2.5, mode=Mode.SUBTRACT)
    with BuildSketch(Plane(origin=(20.1, -10, 22.9), x_dir=(1, 0, 0), z_dir=(0, 0, -1))) as fillet_1_3_piece_6:
        with BuildLine():
            CenterArc((FILLET_1_R, -FILLET_1_R), FILLET_1_R, 90, 90)
            Line((0, -FILLET_1_R), (0, 0))
            Line((0, 0), (FILLET_1_R, 0))
        make_face()
    extrude(amount=1.9, mode=Mode.SUBTRACT)
    with BuildSketch(Plane(origin=(19.1, -10, 20), x_dir=(0, 0, -1), z_dir=(-1, 0, 0))) as fillet_1_3_piece_7:
        with BuildLine():
            CenterArc((FILLET_1_R, -FILLET_1_R), FILLET_1_R, 90, 90)
            Line((0, -FILLET_1_R), (0, 0))
            Line((0, 0), (FILLET_1_R, 0))
        make_face()
    extrude(amount=18.1, mode=Mode.SUBTRACT)
    with BuildSketch(Plane(origin=(20.1, 10, 22.9), x_dir=(1, 0, 0), z_dir=(0, 0, -1))) as fillet_1_3_piece_8:
        with BuildLine():
            CenterArc((FILLET_1_R, FILLET_1_R), FILLET_1_R, 180, 90)
            Line((0, FILLET_1_R), (0, 0))
            Line((0, 0), (FILLET_1_R, 0))
        make_face()
    extrude(amount=1.9, mode=Mode.SUBTRACT)
    with BuildSketch(Plane(origin=(16.6, 10, 23.9), x_dir=(0, 0, 1), z_dir=(1, 0, 0))) as fillet_1_3_piece_9:
        with BuildLine():
            CenterArc((FILLET_1_R, FILLET_1_R), FILLET_1_R, 180, 90)
            Line((0, FILLET_1_R), (0, 0))
            Line((0, 0), (FILLET_1_R, 0))
        make_face()
    extrude(amount=2.5, mode=Mode.SUBTRACT)
    with BuildSketch(Plane(origin=(19.1, 10, 20), x_dir=(0, 0, -1), z_dir=(-1, 0, 0))) as fillet_1_3_piece_10:
        with BuildLine():
            CenterArc((FILLET_1_R, FILLET_1_R), FILLET_1_R, 180, 90)
            Line((0, FILLET_1_R), (0, 0))
            Line((0, 0), (FILLET_1_R, 0))
        make_face()
    extrude(amount=18.1, mode=Mode.SUBTRACT)
    with BuildSketch(Plane(origin=(19.1, 10, 21), x_dir=(0, 0, -1), z_dir=(-1, 0, 0))) as fillet_1_3_piece_11:
        with BuildLine():
            CenterArc((1 + FILLET_1_R, FILLET_1_R), FILLET_1_R, 180, 90)
            Line((1, FILLET_1_R), (1, 0))
            Line((1, 0), (1 + FILLET_1_R, 0))
        make_face()
    revolve(axis=Axis((19.1, 10, 21), (0, -1, 0)), revolution_arc=90, mode=Mode.SUBTRACT)
    with BuildSketch(Plane(origin=(19.1, 10, 22.9), x_dir=(1, 0, 0), z_dir=(0, 0, -1))) as fillet_1_3_piece_12:
        with BuildLine():
            CenterArc((1 + FILLET_1_R, FILLET_1_R), FILLET_1_R, 180, 90)
            Line((1, FILLET_1_R), (1, 0))
            Line((1, 0), (1 + FILLET_1_R, 0))
        make_face()
    revolve(axis=Axis((19.1, 10, 22.9), (0, -1, 0)), revolution_arc=90, mode=Mode.SUBTRACT)
    with BuildSketch(Plane(origin=(19.1, -10, 21), x_dir=(0, 0, -1), z_dir=(-1, 0, 0))) as fillet_1_3_piece_13:
        with BuildLine():
            CenterArc((1 + FILLET_1_R, -FILLET_1_R), FILLET_1_R, 90, 90)
            Line((1, -FILLET_1_R), (1, 0))
            Line((1, 0), (1 + FILLET_1_R, 0))
        make_face()
    revolve(axis=Axis((19.1, -10, 21), (0, -1, 0)), revolution_arc=90, mode=Mode.SUBTRACT)
    with BuildSketch(Plane(origin=(19.1, -10, 22.9), x_dir=(1, 0, 0), z_dir=(0, 0, -1))) as fillet_1_3_piece_14:
        with BuildLine():
            CenterArc((1 + FILLET_1_R, -FILLET_1_R), FILLET_1_R, 90, 90)
            Line((1, -FILLET_1_R), (1, 0))
            Line((1, 0), (1 + FILLET_1_R, 0))
        make_face()
    revolve(axis=Axis((19.1, -10, 22.9), (0, -1, 0)), revolution_arc=90, mode=Mode.SUBTRACT)


solid = part.part
